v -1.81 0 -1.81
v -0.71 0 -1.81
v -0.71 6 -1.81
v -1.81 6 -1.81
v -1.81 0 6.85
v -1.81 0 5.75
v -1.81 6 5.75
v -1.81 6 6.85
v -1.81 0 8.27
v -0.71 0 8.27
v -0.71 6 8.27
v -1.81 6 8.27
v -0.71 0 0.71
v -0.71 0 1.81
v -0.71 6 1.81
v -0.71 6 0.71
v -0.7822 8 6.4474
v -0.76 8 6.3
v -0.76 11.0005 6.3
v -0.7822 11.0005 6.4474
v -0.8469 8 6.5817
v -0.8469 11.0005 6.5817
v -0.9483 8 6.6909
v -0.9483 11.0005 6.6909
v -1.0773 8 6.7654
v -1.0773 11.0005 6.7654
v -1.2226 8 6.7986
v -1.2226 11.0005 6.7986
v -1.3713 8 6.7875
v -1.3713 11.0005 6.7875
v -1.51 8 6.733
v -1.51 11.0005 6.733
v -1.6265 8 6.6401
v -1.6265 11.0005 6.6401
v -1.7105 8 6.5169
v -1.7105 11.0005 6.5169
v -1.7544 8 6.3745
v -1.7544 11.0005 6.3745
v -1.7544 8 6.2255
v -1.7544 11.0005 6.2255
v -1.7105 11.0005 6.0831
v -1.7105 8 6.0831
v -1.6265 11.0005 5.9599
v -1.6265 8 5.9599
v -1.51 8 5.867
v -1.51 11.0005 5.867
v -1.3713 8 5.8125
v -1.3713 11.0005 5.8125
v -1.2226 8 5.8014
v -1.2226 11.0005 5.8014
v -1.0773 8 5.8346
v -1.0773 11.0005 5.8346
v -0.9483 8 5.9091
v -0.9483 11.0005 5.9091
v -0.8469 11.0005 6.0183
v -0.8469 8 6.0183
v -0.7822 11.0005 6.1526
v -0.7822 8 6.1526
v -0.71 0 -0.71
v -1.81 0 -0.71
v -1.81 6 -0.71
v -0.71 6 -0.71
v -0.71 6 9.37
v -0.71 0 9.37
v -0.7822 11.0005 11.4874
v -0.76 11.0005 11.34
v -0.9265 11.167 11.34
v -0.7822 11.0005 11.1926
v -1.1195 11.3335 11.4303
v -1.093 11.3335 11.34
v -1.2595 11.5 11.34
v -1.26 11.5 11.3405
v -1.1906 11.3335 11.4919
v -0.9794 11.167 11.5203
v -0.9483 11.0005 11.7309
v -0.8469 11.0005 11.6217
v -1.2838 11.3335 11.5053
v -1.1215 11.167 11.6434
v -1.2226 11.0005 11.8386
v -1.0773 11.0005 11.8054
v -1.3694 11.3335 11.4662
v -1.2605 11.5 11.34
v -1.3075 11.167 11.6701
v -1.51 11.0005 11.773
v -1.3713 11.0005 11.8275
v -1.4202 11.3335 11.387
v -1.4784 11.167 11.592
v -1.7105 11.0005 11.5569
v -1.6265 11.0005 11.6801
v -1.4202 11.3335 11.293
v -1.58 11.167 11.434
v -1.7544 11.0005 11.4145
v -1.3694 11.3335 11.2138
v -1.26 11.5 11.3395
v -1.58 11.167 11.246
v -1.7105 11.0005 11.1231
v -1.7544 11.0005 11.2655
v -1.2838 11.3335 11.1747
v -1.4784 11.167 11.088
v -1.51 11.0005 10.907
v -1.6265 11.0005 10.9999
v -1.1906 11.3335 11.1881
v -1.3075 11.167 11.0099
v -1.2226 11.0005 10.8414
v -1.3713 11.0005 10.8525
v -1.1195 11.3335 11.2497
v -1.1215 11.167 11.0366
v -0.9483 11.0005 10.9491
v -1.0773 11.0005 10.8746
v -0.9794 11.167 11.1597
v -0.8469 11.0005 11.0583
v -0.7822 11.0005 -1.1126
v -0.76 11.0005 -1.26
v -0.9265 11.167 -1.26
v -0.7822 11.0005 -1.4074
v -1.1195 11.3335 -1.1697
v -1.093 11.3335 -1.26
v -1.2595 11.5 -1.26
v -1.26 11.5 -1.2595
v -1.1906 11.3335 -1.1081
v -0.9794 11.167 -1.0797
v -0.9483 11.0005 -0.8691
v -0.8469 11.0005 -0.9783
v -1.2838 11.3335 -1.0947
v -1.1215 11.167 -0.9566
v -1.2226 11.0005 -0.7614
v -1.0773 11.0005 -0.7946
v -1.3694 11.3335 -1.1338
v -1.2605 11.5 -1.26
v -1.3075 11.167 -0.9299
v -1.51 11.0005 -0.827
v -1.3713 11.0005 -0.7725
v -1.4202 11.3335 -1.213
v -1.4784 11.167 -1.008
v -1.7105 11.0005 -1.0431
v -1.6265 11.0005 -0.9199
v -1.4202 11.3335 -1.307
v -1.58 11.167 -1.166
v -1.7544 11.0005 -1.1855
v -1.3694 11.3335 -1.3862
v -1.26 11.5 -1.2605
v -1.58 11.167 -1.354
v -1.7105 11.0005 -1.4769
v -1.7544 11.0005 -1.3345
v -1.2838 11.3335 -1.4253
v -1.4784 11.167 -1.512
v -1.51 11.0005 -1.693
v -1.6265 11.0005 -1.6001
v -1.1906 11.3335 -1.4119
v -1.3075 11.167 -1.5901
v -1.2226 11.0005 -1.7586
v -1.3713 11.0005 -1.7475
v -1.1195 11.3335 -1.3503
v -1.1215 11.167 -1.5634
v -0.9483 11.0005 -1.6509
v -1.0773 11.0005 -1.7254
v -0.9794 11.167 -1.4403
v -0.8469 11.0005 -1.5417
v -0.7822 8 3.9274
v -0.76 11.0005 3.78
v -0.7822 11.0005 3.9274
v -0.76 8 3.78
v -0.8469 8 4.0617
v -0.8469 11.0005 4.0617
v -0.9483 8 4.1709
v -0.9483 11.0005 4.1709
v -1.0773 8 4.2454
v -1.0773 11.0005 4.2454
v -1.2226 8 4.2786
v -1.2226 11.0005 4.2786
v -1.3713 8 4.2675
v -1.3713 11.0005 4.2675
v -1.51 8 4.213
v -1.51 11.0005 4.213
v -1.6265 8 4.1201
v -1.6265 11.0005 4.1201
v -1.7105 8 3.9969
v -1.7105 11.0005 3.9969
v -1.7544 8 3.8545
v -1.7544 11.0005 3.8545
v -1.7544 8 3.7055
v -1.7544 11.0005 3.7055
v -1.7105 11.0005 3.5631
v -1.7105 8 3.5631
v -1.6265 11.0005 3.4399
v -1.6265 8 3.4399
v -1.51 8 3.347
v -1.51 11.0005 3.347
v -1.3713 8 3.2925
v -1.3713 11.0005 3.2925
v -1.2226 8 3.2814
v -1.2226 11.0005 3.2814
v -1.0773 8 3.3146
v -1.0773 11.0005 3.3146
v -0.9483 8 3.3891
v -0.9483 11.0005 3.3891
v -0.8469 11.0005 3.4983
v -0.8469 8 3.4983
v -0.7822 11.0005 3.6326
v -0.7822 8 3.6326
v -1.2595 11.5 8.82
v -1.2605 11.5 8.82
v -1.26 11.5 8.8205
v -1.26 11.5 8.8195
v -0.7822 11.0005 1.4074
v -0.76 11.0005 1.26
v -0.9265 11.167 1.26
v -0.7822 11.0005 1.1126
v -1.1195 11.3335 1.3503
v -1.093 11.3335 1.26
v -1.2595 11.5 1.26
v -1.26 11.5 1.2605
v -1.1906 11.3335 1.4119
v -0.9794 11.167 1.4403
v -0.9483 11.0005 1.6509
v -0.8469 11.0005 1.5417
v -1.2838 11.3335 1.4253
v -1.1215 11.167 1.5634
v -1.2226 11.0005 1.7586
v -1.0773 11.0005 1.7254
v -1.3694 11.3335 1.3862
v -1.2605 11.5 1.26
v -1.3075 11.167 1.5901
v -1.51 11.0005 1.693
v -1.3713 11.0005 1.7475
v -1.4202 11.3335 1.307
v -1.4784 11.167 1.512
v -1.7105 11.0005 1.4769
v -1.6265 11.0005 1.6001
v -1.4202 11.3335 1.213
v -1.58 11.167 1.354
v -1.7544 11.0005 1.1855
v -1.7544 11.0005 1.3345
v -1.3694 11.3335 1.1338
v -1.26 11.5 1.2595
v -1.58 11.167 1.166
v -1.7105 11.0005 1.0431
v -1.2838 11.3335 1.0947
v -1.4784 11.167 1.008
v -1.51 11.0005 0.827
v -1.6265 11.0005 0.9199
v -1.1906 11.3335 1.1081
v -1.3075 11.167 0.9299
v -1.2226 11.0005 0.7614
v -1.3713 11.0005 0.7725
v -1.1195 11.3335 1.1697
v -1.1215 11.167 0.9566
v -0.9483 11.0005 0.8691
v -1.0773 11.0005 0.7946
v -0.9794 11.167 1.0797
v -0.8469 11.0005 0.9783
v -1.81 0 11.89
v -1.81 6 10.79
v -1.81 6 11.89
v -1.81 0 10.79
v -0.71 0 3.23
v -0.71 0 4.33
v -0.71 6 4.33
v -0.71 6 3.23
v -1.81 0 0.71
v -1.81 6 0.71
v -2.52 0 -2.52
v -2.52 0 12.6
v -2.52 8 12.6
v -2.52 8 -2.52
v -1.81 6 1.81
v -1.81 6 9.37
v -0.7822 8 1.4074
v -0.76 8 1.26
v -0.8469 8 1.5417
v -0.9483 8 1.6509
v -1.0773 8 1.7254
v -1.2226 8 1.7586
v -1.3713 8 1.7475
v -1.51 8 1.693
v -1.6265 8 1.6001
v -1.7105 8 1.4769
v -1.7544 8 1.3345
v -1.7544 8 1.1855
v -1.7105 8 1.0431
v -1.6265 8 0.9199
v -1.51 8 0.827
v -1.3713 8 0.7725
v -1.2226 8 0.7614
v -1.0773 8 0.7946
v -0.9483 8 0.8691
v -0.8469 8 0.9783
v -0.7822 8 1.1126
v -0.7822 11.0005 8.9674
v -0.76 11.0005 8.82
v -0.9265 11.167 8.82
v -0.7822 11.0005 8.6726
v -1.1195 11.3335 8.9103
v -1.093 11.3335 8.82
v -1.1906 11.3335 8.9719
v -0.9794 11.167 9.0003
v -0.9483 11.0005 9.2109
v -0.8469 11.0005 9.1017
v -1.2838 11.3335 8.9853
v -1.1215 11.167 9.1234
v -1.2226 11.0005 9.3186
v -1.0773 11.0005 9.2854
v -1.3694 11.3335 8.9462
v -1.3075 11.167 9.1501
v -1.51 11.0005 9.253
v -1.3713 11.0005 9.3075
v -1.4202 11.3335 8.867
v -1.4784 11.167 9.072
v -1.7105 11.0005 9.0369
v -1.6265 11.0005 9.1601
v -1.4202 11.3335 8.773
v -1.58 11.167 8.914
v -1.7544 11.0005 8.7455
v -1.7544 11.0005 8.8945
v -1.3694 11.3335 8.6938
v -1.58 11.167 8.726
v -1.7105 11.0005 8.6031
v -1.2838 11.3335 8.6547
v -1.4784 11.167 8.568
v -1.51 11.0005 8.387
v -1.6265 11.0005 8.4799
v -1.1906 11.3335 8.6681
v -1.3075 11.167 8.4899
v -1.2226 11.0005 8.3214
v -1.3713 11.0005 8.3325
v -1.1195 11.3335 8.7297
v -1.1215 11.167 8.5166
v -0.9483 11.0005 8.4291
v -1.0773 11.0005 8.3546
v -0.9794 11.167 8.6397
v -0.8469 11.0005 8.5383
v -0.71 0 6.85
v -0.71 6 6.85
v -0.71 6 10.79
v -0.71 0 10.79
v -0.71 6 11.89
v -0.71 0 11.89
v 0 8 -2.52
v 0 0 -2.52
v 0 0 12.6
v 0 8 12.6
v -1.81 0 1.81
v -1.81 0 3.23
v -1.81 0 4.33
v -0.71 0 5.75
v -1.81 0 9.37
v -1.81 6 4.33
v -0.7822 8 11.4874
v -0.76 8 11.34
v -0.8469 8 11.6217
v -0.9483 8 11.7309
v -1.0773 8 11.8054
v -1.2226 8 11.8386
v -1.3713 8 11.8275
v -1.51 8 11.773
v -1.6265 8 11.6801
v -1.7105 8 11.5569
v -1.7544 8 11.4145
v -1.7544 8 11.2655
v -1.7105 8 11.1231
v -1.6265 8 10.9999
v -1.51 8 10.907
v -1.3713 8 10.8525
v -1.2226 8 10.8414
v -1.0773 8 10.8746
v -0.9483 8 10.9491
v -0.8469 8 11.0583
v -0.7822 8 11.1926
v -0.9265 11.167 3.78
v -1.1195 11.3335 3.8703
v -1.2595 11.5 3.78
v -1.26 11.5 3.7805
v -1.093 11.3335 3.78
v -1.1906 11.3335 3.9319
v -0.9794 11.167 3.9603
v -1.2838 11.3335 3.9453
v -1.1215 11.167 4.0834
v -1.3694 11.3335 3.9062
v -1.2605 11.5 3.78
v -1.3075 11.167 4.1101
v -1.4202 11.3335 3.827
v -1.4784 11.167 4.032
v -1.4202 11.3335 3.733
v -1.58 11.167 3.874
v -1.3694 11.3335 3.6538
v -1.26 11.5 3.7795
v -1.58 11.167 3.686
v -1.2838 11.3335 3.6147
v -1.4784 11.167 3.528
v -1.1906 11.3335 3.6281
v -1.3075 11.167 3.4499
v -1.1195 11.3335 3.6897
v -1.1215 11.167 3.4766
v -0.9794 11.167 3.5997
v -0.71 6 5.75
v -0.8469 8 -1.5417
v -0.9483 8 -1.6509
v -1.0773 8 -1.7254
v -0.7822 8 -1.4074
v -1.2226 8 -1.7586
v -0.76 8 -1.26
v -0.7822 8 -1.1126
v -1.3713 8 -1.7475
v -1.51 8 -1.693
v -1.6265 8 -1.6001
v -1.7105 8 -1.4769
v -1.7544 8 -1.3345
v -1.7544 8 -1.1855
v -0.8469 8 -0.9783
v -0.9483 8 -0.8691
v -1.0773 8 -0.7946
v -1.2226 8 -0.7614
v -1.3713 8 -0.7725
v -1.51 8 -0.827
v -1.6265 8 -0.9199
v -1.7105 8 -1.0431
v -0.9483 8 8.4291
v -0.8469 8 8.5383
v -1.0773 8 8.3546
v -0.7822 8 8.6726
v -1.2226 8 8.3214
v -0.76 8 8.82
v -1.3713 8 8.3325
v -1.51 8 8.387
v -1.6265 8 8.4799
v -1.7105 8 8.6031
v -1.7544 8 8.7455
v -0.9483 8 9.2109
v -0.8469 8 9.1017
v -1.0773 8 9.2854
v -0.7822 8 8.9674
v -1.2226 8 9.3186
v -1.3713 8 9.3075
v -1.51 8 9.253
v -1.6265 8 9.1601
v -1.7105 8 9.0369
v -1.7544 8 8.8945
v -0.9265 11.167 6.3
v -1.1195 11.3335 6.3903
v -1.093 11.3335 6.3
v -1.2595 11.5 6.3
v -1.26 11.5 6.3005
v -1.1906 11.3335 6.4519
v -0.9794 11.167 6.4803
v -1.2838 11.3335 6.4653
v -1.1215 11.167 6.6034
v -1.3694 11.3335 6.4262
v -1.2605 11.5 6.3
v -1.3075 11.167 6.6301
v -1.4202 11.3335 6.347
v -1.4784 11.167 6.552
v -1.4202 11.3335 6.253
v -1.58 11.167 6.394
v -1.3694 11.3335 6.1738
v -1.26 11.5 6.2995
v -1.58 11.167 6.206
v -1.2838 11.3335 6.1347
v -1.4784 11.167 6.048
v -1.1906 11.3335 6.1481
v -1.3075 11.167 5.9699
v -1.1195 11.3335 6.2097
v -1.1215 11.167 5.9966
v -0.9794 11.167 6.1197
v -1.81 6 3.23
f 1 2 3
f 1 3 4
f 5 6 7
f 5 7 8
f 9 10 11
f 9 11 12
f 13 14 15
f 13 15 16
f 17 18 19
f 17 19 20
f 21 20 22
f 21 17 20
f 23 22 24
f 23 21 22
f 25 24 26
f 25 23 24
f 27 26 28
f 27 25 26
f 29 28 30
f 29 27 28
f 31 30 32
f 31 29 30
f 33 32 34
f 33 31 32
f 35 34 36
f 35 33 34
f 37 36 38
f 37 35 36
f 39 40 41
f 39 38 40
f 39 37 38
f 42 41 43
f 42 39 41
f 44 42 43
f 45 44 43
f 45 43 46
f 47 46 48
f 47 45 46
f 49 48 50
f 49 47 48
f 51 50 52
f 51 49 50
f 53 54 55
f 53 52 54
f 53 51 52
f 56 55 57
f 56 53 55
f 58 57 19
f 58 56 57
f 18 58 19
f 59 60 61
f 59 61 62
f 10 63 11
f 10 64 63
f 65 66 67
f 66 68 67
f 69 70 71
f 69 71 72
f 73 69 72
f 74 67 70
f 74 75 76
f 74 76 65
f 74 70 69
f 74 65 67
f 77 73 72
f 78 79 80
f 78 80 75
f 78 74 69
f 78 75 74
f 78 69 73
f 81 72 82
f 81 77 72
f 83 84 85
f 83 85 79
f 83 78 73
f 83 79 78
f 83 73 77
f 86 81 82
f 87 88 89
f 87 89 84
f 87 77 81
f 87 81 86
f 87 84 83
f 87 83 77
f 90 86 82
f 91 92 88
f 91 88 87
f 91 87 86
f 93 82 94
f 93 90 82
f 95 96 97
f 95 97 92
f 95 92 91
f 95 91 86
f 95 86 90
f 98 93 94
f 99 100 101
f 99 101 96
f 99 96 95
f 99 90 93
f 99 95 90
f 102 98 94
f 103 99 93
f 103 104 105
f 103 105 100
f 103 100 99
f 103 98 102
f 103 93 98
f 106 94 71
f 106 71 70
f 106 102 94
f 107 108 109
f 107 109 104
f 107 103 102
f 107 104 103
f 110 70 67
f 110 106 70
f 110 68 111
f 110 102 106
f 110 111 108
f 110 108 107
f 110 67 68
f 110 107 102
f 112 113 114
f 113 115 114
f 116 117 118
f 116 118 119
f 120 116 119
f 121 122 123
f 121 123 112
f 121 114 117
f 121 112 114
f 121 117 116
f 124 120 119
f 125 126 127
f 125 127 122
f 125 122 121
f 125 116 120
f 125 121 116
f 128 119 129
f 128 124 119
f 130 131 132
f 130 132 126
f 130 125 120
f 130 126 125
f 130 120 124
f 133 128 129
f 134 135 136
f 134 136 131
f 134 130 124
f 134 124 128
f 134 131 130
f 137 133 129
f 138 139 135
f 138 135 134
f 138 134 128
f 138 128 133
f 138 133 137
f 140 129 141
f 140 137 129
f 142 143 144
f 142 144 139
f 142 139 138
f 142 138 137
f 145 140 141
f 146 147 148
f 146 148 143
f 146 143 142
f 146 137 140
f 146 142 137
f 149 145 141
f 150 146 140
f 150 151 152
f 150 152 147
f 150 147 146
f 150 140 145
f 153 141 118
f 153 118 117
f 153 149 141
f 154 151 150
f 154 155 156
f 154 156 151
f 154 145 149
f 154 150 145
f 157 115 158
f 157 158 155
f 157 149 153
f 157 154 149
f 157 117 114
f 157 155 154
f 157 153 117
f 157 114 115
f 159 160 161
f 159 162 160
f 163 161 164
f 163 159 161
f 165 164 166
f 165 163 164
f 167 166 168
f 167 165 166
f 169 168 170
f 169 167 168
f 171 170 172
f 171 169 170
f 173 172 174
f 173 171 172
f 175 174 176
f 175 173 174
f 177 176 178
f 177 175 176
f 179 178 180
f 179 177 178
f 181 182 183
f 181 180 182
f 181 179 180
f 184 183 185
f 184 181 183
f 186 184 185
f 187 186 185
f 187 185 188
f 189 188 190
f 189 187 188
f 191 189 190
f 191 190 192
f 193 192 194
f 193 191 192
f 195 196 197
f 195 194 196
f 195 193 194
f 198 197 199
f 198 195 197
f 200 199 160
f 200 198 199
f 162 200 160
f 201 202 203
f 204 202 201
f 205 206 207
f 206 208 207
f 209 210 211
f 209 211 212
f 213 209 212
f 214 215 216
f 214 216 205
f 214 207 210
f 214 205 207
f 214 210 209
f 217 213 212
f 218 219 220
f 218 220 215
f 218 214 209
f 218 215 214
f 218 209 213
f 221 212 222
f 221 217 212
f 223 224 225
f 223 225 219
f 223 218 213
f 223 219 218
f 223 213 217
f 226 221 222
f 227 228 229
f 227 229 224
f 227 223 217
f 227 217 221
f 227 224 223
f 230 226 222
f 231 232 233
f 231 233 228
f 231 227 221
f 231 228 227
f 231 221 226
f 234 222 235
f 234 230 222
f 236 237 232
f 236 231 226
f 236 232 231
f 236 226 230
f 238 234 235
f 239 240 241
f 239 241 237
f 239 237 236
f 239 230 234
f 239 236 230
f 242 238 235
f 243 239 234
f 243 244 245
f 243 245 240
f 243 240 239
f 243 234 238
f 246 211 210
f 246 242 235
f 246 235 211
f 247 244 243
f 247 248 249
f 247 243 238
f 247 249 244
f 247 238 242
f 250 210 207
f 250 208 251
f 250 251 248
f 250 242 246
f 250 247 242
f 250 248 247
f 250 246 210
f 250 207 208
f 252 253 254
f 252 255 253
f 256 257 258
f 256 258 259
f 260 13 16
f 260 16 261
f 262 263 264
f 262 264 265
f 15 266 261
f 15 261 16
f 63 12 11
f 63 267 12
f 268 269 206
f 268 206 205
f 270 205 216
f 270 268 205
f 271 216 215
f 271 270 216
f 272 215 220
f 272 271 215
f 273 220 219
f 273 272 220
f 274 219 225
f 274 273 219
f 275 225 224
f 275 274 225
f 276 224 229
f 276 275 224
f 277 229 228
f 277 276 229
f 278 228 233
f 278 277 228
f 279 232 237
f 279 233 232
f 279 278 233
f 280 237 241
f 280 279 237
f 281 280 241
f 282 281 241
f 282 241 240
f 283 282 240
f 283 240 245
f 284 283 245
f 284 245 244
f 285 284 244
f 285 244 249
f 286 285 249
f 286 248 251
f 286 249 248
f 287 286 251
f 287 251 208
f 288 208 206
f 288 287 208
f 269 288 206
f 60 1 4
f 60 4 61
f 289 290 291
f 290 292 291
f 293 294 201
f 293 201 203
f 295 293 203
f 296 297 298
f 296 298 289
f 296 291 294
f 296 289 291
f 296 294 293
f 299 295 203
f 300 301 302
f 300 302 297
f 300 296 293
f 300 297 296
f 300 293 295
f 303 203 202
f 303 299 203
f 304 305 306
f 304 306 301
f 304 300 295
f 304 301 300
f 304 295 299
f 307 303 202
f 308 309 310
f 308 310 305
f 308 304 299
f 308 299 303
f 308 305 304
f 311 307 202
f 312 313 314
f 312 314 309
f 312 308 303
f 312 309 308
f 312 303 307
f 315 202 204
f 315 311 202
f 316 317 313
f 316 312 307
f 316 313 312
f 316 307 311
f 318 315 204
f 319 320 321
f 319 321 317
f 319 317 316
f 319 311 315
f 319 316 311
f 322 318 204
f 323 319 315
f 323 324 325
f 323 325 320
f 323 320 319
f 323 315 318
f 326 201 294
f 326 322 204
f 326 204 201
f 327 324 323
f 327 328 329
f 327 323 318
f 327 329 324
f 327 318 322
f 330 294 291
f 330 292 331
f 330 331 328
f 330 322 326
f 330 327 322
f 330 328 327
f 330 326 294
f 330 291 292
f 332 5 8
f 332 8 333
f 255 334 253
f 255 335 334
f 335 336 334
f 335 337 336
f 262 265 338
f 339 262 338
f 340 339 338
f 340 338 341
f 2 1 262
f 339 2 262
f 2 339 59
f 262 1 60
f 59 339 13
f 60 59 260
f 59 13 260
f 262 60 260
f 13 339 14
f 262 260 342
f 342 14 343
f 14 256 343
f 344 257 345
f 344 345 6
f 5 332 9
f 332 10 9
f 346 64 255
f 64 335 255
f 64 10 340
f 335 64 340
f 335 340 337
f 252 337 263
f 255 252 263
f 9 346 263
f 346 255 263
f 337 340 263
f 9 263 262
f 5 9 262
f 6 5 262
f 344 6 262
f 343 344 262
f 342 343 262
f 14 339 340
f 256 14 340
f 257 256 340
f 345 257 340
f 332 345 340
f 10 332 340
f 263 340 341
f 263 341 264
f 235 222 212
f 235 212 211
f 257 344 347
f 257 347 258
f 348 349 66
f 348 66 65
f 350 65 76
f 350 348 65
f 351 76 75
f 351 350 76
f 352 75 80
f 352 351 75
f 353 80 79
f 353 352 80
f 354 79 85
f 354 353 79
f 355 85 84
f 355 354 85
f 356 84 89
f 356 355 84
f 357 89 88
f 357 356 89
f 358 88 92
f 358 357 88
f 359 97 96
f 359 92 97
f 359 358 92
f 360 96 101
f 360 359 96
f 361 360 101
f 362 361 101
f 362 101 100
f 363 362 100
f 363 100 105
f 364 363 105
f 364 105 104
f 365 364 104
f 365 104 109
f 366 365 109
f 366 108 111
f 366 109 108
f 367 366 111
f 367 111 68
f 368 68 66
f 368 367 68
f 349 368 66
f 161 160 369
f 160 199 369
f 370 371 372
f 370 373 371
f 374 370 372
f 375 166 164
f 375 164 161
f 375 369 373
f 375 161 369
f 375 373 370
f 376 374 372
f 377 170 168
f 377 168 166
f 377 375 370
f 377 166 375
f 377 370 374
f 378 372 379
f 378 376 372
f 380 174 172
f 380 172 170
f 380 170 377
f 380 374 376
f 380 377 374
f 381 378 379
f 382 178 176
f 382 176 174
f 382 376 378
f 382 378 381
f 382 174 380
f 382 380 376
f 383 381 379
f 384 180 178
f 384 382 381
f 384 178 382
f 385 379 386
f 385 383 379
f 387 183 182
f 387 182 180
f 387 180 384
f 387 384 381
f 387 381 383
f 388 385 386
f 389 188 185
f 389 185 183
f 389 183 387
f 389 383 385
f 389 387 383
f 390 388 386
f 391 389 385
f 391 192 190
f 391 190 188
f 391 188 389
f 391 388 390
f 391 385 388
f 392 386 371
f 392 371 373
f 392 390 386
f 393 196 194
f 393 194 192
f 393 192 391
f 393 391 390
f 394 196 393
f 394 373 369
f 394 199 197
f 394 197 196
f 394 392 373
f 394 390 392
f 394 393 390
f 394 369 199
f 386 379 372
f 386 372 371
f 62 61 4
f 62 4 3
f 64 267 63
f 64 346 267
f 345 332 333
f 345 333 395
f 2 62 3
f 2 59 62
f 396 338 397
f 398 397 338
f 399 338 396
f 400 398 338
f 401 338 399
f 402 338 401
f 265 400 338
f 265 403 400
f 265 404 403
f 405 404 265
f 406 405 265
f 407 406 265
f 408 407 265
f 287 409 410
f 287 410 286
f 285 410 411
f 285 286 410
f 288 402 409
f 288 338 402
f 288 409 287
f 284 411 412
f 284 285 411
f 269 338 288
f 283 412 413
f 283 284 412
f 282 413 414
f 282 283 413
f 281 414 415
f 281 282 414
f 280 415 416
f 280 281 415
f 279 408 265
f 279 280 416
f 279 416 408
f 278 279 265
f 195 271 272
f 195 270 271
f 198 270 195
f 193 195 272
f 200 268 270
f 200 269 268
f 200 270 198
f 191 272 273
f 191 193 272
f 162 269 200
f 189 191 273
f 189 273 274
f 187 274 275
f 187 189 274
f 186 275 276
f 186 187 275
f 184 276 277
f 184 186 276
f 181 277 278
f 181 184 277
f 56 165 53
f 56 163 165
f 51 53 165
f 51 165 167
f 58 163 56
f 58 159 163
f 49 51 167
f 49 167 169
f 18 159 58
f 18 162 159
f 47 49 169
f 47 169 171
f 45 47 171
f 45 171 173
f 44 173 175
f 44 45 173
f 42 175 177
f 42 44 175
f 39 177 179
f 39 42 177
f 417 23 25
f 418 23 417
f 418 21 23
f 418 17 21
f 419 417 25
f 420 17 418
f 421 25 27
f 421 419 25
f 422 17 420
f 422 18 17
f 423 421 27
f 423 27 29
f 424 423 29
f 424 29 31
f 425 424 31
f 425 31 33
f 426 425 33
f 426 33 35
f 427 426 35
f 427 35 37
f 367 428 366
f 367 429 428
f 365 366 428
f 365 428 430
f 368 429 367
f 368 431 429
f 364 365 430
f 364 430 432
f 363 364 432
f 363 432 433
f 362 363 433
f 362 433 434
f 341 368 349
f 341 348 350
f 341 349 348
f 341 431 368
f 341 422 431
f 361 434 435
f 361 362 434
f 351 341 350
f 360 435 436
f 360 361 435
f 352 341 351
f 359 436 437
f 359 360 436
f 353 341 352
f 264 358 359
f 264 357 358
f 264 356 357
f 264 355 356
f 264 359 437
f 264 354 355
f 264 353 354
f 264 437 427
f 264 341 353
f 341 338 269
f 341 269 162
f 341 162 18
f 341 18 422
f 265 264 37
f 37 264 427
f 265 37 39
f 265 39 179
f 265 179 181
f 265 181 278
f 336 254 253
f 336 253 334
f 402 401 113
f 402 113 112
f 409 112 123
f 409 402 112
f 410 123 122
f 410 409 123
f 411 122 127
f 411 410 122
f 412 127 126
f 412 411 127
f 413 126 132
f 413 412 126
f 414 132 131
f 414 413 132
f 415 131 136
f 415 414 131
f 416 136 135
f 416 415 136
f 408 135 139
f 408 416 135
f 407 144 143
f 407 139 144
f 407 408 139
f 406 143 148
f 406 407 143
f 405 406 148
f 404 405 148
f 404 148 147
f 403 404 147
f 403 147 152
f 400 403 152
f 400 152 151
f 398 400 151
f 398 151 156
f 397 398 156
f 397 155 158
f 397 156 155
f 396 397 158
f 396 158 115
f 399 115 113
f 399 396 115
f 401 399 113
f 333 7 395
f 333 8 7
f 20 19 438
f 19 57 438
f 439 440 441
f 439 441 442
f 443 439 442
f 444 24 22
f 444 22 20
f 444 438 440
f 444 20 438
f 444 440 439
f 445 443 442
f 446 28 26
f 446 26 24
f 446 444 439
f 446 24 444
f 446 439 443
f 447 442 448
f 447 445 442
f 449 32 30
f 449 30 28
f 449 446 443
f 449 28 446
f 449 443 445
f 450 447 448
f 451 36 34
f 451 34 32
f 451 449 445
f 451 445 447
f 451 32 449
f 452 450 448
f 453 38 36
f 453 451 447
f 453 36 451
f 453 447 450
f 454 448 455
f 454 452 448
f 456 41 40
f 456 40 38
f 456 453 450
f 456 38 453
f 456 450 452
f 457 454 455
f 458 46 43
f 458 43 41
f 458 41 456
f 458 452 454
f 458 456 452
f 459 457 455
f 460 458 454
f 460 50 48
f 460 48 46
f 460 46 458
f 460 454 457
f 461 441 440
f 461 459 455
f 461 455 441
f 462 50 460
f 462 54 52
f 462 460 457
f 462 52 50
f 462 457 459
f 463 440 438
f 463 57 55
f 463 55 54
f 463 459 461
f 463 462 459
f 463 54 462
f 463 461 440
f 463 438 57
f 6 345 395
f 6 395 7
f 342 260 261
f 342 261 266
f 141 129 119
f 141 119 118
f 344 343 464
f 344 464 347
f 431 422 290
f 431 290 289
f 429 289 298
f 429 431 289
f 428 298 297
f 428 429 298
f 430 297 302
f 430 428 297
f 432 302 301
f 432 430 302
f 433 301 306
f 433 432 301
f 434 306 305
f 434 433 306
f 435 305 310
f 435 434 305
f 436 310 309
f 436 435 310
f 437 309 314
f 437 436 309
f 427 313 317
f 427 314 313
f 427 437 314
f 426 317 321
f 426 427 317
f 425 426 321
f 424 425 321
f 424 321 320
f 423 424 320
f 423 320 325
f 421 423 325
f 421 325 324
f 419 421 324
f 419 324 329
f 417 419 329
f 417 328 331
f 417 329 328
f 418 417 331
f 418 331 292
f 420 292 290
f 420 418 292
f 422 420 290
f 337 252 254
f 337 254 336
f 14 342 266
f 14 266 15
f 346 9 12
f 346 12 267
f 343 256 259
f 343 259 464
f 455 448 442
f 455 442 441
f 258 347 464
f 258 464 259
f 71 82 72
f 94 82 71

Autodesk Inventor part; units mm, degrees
ref_plane "YZ Plane" through (0, 0, 0) normal (1, 0, 0) x (0, 1, 0)
ref_plane "XZ Plane" through (0, 0, 0) normal (0, 1, 0) x (-1, 0, 0)
ref_plane "XY Plane" through (0, 0, 0) normal (0, 0, 1) x (1, 0, 0)
sketch "Эскиз1" plane through (0, 0, 0) normal (0, 1, 0) x (-1, 0, 0)
  line L0 (0, 0) -> (2.52, 0)
  line L1 (2.52, 0) -> (2.52, -2.52)
  line L2 (2.52, -2.52) -> (0, -2.52)
  line L3 (0, -2.52) -> (0, 0)
  dimension "d1" = 2.52
  dimension "d2" = 2.52
extrude "Выдавливание1" add sketch "Эскиз1" along normal blind 8
sketch "Эскиз2" plane through (0, 8, 0) normal (0, 1, 0) x (1, 0, 0)
  line L0 (-2.52, 2.52) -> (-2.52, 0) construction
  line L1 (0, 0) -> (0, 2.52) construction
  line L2 (-2.52, 0) -> (0, 2.52) construction
  circle A0 centre (-1.26, 1.26) radius 0.5
  dimension "d22" = 1
extrude "Выдавливание2" add sketch "Эскиз2" along normal blind 3.5
chamfer "Фаска3" distance 0.5 angle 45 1 edges at (-1.76, 11.5, -1.26)
sketch "Эскиз3" plane through (0, 0, 0) normal (0, -1, 0) x (1, 0, 0)
  line L0 (0, 0) -> (0, -2.52) construction
  line L1 (0, -2.52) -> (-2.52, -2.52) construction
  line L2 (0, 0) -> (-2.52, -2.52) construction
  line L3 (-1.81, -0.71) -> (-0.71, -0.71)
  line L4 (-0.71, -0.71) -> (-0.71, -1.81)
  line L5 (-0.71, -1.81) -> (-1.81, -1.81)
  line L6 (-1.81, -1.81) -> (-1.81, -0.71)
  line L7 (-1.81, -0.71) -> (-0.71, -1.81) construction
  line L8 (-0.71, -0.71) -> (-1.81, -1.81) construction
  point P0 (-1.26, -1.26)
  dimension "d15" = 1.1
  dimension "d16" = 1.1
extrude "Выдавливание3" cut sketch "Эскиз3" against normal blind 6
pattern_linear "Прямоуг.массив1" count 6 spacing 2.52 along (0, 0, 1) of "Выдавливание1", "Выдавливание2", "Выдавливание3", "Фаска3"
properties part number "Гребенка 20 МАМА"
